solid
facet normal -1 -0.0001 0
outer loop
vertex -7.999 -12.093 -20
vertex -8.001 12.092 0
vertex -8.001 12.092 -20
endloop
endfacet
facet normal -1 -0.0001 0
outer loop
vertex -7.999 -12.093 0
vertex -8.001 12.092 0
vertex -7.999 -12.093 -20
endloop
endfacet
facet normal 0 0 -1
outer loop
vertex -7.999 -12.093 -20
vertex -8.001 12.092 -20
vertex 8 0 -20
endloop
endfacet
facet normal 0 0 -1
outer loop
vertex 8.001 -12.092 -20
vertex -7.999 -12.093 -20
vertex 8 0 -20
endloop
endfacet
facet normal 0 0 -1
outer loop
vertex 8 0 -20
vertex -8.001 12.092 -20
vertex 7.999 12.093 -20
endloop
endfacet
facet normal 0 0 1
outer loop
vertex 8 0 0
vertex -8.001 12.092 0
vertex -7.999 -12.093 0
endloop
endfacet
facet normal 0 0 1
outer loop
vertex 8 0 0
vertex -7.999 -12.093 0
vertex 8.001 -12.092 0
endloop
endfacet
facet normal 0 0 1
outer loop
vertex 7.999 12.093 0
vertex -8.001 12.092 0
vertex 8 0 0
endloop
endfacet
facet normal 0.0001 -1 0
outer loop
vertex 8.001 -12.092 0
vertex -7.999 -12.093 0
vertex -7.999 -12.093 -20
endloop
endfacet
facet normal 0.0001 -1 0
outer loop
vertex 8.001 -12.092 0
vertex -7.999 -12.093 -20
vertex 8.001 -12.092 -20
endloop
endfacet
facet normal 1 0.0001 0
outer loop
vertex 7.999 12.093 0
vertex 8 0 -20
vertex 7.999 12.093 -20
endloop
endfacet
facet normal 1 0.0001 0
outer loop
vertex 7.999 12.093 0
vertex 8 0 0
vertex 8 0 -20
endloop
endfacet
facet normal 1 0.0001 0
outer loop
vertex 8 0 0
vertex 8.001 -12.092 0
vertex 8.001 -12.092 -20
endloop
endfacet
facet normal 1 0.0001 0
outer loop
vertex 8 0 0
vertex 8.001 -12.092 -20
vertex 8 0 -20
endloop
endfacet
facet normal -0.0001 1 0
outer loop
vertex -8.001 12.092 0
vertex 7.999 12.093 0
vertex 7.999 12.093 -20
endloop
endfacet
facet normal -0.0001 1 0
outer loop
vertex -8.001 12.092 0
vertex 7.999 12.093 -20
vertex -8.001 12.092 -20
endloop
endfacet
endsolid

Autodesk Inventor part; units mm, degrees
ref_plane "YZ Plane" through (0, 0, 0) normal (1, 0, 0) x (0, 1, 0)
ref_plane "XZ Plane" through (0, 0, 0) normal (0, 1, 0) x (-1, 0, 0)
ref_plane "XY Plane" through (0, 0, 0) normal (0, 0, 1) x (1, 0, 0)
ref_plane "Work Plane2" through (0, 0, 0) normal (0, 0, 1) x (1, 0, 0)
sketch "Sketch1" plane through (0, 0, 0) normal (0, 0, 1) x (1, 0, 0)
  line L0 (-0.0117, -20.0006) -> (-0.012, -20.0006)
  line L1 (-14.2652, 14.2822) -> (-14.2652, 14.1579)
  line L2 (11.2397, 17.0322) -> (11.2387, 17.0322)
  line L3 (13.9887, 16.9079) -> (13.9887, 17.0322)
  line L4 (0, 0) -> (8, 0)
  line L5 (-0.0117, -18.8998) -> (-0.0117, -18.8993)
  line L6 (-0.0117, -18.8998) -> (11.2397, -18.8993)
  line L7 (16.1373, -14.0168) -> (16.1373, 14.2822)
  line L8 (11.2275, 19.0322) -> (-11.2913, 19.0322)
  line L9 (-16.2652, 14.1579) -> (-16.2652, -14.1446)
  line L10 (-11.2913, 19.0322) -> (11.2275, 19.0322)
  line L11 (11.2397, -18.8993) -> (-11.3582, -18.8993)
  line L12 (13.9887, 14.2822) -> (11.2275, 14.27)
  line L13 (-11.2913, 14.1579) -> (-14.2652, 14.1579)
  line L14 (11.2275, 19.0322) -> (11.2275, 14.27)
  line L15 (11.2397, -14.0168) -> (11.2397, -18.8993)
  line L16 (-11.3582, -18.8993) -> (-11.3582, -14.1381)
  line L17 (-11.2913, 14.1579) -> (-11.2913, 19.0322)
  line L18 (-12.7398, -14.1446) -> (-11.3582, -14.1381)
  line L19 (11.2397, -14.0168) -> (14.1373, -14.0168)
  line L20 (18.0012, -16.7666) -> (18.0012, -16.9004)
  line L21 (17.9998, -0.0855) -> (18.0002, 0)
  line L22 (18, 16.9079) -> (18, 17.0322)
  line L23 (18.0671, 19.0322) -> (18.0671, 19.9991)
  line L24 (13.9887, 19.9331) -> (13.9887, 19.9331)
  line L25 (-0.0117, 19.9998) -> (0.1781, 19.9998)
  line L26 (-18, 20) -> (-17.9861, 20)
  line L27 (-14.2652, 20.0091) -> (-14.2559, 20.0091)
  line L28 (-18, 16.9079) -> (-18, 17.0322)
  line L29 (-17.9852, -16.7683) -> (-17.983, -16.9196)
  line L30 (-12.7398, -14.1446) -> (-16.2652, -14.1446)
  line L31 (-14.2652, 14.1579) -> (-16.2652, 14.1579)
  line L32 (13.9887, 14.2822) -> (16.1373, 14.2822)
  line L33 (14.1373, -14.0168) -> (16.1373, -14.0168)
  line L34 (-14.1063, -16.9012) -> (-13.9534, -16.9004)
  line L35 (-14.2559, -18.8993) -> (-14.2559, -18.9004)
  line L36 (-11.3582, -16.8881) -> (-11.2913, -16.8878)
  line L37 (11.2275, -16.7807) -> (11.2397, -16.7806)
  line L38 (-7.9994, -12.0931) -> (8.0006, -12.0923)
  line L39 (8.0006, -12.0923) -> (7.9994, 12.0931)
  line L40 (7.9994, 12.0931) -> (-8.0006, 12.0923)
  line L41 (-8.0006, 12.0923) -> (-7.9994, -12.0931)
  line L42 (-7.9994, -12.0931) -> (7.9994, 12.0931) construction
  line L43 (8.0006, -12.0923) -> (-8.0006, 12.0923) construction
  dimension "d11" = 8
extrude "Extrusion1" add sketch "Sketch1" against normal blind 20 contours L41 L40 L39 L38
properties part number "filament_feeder"
